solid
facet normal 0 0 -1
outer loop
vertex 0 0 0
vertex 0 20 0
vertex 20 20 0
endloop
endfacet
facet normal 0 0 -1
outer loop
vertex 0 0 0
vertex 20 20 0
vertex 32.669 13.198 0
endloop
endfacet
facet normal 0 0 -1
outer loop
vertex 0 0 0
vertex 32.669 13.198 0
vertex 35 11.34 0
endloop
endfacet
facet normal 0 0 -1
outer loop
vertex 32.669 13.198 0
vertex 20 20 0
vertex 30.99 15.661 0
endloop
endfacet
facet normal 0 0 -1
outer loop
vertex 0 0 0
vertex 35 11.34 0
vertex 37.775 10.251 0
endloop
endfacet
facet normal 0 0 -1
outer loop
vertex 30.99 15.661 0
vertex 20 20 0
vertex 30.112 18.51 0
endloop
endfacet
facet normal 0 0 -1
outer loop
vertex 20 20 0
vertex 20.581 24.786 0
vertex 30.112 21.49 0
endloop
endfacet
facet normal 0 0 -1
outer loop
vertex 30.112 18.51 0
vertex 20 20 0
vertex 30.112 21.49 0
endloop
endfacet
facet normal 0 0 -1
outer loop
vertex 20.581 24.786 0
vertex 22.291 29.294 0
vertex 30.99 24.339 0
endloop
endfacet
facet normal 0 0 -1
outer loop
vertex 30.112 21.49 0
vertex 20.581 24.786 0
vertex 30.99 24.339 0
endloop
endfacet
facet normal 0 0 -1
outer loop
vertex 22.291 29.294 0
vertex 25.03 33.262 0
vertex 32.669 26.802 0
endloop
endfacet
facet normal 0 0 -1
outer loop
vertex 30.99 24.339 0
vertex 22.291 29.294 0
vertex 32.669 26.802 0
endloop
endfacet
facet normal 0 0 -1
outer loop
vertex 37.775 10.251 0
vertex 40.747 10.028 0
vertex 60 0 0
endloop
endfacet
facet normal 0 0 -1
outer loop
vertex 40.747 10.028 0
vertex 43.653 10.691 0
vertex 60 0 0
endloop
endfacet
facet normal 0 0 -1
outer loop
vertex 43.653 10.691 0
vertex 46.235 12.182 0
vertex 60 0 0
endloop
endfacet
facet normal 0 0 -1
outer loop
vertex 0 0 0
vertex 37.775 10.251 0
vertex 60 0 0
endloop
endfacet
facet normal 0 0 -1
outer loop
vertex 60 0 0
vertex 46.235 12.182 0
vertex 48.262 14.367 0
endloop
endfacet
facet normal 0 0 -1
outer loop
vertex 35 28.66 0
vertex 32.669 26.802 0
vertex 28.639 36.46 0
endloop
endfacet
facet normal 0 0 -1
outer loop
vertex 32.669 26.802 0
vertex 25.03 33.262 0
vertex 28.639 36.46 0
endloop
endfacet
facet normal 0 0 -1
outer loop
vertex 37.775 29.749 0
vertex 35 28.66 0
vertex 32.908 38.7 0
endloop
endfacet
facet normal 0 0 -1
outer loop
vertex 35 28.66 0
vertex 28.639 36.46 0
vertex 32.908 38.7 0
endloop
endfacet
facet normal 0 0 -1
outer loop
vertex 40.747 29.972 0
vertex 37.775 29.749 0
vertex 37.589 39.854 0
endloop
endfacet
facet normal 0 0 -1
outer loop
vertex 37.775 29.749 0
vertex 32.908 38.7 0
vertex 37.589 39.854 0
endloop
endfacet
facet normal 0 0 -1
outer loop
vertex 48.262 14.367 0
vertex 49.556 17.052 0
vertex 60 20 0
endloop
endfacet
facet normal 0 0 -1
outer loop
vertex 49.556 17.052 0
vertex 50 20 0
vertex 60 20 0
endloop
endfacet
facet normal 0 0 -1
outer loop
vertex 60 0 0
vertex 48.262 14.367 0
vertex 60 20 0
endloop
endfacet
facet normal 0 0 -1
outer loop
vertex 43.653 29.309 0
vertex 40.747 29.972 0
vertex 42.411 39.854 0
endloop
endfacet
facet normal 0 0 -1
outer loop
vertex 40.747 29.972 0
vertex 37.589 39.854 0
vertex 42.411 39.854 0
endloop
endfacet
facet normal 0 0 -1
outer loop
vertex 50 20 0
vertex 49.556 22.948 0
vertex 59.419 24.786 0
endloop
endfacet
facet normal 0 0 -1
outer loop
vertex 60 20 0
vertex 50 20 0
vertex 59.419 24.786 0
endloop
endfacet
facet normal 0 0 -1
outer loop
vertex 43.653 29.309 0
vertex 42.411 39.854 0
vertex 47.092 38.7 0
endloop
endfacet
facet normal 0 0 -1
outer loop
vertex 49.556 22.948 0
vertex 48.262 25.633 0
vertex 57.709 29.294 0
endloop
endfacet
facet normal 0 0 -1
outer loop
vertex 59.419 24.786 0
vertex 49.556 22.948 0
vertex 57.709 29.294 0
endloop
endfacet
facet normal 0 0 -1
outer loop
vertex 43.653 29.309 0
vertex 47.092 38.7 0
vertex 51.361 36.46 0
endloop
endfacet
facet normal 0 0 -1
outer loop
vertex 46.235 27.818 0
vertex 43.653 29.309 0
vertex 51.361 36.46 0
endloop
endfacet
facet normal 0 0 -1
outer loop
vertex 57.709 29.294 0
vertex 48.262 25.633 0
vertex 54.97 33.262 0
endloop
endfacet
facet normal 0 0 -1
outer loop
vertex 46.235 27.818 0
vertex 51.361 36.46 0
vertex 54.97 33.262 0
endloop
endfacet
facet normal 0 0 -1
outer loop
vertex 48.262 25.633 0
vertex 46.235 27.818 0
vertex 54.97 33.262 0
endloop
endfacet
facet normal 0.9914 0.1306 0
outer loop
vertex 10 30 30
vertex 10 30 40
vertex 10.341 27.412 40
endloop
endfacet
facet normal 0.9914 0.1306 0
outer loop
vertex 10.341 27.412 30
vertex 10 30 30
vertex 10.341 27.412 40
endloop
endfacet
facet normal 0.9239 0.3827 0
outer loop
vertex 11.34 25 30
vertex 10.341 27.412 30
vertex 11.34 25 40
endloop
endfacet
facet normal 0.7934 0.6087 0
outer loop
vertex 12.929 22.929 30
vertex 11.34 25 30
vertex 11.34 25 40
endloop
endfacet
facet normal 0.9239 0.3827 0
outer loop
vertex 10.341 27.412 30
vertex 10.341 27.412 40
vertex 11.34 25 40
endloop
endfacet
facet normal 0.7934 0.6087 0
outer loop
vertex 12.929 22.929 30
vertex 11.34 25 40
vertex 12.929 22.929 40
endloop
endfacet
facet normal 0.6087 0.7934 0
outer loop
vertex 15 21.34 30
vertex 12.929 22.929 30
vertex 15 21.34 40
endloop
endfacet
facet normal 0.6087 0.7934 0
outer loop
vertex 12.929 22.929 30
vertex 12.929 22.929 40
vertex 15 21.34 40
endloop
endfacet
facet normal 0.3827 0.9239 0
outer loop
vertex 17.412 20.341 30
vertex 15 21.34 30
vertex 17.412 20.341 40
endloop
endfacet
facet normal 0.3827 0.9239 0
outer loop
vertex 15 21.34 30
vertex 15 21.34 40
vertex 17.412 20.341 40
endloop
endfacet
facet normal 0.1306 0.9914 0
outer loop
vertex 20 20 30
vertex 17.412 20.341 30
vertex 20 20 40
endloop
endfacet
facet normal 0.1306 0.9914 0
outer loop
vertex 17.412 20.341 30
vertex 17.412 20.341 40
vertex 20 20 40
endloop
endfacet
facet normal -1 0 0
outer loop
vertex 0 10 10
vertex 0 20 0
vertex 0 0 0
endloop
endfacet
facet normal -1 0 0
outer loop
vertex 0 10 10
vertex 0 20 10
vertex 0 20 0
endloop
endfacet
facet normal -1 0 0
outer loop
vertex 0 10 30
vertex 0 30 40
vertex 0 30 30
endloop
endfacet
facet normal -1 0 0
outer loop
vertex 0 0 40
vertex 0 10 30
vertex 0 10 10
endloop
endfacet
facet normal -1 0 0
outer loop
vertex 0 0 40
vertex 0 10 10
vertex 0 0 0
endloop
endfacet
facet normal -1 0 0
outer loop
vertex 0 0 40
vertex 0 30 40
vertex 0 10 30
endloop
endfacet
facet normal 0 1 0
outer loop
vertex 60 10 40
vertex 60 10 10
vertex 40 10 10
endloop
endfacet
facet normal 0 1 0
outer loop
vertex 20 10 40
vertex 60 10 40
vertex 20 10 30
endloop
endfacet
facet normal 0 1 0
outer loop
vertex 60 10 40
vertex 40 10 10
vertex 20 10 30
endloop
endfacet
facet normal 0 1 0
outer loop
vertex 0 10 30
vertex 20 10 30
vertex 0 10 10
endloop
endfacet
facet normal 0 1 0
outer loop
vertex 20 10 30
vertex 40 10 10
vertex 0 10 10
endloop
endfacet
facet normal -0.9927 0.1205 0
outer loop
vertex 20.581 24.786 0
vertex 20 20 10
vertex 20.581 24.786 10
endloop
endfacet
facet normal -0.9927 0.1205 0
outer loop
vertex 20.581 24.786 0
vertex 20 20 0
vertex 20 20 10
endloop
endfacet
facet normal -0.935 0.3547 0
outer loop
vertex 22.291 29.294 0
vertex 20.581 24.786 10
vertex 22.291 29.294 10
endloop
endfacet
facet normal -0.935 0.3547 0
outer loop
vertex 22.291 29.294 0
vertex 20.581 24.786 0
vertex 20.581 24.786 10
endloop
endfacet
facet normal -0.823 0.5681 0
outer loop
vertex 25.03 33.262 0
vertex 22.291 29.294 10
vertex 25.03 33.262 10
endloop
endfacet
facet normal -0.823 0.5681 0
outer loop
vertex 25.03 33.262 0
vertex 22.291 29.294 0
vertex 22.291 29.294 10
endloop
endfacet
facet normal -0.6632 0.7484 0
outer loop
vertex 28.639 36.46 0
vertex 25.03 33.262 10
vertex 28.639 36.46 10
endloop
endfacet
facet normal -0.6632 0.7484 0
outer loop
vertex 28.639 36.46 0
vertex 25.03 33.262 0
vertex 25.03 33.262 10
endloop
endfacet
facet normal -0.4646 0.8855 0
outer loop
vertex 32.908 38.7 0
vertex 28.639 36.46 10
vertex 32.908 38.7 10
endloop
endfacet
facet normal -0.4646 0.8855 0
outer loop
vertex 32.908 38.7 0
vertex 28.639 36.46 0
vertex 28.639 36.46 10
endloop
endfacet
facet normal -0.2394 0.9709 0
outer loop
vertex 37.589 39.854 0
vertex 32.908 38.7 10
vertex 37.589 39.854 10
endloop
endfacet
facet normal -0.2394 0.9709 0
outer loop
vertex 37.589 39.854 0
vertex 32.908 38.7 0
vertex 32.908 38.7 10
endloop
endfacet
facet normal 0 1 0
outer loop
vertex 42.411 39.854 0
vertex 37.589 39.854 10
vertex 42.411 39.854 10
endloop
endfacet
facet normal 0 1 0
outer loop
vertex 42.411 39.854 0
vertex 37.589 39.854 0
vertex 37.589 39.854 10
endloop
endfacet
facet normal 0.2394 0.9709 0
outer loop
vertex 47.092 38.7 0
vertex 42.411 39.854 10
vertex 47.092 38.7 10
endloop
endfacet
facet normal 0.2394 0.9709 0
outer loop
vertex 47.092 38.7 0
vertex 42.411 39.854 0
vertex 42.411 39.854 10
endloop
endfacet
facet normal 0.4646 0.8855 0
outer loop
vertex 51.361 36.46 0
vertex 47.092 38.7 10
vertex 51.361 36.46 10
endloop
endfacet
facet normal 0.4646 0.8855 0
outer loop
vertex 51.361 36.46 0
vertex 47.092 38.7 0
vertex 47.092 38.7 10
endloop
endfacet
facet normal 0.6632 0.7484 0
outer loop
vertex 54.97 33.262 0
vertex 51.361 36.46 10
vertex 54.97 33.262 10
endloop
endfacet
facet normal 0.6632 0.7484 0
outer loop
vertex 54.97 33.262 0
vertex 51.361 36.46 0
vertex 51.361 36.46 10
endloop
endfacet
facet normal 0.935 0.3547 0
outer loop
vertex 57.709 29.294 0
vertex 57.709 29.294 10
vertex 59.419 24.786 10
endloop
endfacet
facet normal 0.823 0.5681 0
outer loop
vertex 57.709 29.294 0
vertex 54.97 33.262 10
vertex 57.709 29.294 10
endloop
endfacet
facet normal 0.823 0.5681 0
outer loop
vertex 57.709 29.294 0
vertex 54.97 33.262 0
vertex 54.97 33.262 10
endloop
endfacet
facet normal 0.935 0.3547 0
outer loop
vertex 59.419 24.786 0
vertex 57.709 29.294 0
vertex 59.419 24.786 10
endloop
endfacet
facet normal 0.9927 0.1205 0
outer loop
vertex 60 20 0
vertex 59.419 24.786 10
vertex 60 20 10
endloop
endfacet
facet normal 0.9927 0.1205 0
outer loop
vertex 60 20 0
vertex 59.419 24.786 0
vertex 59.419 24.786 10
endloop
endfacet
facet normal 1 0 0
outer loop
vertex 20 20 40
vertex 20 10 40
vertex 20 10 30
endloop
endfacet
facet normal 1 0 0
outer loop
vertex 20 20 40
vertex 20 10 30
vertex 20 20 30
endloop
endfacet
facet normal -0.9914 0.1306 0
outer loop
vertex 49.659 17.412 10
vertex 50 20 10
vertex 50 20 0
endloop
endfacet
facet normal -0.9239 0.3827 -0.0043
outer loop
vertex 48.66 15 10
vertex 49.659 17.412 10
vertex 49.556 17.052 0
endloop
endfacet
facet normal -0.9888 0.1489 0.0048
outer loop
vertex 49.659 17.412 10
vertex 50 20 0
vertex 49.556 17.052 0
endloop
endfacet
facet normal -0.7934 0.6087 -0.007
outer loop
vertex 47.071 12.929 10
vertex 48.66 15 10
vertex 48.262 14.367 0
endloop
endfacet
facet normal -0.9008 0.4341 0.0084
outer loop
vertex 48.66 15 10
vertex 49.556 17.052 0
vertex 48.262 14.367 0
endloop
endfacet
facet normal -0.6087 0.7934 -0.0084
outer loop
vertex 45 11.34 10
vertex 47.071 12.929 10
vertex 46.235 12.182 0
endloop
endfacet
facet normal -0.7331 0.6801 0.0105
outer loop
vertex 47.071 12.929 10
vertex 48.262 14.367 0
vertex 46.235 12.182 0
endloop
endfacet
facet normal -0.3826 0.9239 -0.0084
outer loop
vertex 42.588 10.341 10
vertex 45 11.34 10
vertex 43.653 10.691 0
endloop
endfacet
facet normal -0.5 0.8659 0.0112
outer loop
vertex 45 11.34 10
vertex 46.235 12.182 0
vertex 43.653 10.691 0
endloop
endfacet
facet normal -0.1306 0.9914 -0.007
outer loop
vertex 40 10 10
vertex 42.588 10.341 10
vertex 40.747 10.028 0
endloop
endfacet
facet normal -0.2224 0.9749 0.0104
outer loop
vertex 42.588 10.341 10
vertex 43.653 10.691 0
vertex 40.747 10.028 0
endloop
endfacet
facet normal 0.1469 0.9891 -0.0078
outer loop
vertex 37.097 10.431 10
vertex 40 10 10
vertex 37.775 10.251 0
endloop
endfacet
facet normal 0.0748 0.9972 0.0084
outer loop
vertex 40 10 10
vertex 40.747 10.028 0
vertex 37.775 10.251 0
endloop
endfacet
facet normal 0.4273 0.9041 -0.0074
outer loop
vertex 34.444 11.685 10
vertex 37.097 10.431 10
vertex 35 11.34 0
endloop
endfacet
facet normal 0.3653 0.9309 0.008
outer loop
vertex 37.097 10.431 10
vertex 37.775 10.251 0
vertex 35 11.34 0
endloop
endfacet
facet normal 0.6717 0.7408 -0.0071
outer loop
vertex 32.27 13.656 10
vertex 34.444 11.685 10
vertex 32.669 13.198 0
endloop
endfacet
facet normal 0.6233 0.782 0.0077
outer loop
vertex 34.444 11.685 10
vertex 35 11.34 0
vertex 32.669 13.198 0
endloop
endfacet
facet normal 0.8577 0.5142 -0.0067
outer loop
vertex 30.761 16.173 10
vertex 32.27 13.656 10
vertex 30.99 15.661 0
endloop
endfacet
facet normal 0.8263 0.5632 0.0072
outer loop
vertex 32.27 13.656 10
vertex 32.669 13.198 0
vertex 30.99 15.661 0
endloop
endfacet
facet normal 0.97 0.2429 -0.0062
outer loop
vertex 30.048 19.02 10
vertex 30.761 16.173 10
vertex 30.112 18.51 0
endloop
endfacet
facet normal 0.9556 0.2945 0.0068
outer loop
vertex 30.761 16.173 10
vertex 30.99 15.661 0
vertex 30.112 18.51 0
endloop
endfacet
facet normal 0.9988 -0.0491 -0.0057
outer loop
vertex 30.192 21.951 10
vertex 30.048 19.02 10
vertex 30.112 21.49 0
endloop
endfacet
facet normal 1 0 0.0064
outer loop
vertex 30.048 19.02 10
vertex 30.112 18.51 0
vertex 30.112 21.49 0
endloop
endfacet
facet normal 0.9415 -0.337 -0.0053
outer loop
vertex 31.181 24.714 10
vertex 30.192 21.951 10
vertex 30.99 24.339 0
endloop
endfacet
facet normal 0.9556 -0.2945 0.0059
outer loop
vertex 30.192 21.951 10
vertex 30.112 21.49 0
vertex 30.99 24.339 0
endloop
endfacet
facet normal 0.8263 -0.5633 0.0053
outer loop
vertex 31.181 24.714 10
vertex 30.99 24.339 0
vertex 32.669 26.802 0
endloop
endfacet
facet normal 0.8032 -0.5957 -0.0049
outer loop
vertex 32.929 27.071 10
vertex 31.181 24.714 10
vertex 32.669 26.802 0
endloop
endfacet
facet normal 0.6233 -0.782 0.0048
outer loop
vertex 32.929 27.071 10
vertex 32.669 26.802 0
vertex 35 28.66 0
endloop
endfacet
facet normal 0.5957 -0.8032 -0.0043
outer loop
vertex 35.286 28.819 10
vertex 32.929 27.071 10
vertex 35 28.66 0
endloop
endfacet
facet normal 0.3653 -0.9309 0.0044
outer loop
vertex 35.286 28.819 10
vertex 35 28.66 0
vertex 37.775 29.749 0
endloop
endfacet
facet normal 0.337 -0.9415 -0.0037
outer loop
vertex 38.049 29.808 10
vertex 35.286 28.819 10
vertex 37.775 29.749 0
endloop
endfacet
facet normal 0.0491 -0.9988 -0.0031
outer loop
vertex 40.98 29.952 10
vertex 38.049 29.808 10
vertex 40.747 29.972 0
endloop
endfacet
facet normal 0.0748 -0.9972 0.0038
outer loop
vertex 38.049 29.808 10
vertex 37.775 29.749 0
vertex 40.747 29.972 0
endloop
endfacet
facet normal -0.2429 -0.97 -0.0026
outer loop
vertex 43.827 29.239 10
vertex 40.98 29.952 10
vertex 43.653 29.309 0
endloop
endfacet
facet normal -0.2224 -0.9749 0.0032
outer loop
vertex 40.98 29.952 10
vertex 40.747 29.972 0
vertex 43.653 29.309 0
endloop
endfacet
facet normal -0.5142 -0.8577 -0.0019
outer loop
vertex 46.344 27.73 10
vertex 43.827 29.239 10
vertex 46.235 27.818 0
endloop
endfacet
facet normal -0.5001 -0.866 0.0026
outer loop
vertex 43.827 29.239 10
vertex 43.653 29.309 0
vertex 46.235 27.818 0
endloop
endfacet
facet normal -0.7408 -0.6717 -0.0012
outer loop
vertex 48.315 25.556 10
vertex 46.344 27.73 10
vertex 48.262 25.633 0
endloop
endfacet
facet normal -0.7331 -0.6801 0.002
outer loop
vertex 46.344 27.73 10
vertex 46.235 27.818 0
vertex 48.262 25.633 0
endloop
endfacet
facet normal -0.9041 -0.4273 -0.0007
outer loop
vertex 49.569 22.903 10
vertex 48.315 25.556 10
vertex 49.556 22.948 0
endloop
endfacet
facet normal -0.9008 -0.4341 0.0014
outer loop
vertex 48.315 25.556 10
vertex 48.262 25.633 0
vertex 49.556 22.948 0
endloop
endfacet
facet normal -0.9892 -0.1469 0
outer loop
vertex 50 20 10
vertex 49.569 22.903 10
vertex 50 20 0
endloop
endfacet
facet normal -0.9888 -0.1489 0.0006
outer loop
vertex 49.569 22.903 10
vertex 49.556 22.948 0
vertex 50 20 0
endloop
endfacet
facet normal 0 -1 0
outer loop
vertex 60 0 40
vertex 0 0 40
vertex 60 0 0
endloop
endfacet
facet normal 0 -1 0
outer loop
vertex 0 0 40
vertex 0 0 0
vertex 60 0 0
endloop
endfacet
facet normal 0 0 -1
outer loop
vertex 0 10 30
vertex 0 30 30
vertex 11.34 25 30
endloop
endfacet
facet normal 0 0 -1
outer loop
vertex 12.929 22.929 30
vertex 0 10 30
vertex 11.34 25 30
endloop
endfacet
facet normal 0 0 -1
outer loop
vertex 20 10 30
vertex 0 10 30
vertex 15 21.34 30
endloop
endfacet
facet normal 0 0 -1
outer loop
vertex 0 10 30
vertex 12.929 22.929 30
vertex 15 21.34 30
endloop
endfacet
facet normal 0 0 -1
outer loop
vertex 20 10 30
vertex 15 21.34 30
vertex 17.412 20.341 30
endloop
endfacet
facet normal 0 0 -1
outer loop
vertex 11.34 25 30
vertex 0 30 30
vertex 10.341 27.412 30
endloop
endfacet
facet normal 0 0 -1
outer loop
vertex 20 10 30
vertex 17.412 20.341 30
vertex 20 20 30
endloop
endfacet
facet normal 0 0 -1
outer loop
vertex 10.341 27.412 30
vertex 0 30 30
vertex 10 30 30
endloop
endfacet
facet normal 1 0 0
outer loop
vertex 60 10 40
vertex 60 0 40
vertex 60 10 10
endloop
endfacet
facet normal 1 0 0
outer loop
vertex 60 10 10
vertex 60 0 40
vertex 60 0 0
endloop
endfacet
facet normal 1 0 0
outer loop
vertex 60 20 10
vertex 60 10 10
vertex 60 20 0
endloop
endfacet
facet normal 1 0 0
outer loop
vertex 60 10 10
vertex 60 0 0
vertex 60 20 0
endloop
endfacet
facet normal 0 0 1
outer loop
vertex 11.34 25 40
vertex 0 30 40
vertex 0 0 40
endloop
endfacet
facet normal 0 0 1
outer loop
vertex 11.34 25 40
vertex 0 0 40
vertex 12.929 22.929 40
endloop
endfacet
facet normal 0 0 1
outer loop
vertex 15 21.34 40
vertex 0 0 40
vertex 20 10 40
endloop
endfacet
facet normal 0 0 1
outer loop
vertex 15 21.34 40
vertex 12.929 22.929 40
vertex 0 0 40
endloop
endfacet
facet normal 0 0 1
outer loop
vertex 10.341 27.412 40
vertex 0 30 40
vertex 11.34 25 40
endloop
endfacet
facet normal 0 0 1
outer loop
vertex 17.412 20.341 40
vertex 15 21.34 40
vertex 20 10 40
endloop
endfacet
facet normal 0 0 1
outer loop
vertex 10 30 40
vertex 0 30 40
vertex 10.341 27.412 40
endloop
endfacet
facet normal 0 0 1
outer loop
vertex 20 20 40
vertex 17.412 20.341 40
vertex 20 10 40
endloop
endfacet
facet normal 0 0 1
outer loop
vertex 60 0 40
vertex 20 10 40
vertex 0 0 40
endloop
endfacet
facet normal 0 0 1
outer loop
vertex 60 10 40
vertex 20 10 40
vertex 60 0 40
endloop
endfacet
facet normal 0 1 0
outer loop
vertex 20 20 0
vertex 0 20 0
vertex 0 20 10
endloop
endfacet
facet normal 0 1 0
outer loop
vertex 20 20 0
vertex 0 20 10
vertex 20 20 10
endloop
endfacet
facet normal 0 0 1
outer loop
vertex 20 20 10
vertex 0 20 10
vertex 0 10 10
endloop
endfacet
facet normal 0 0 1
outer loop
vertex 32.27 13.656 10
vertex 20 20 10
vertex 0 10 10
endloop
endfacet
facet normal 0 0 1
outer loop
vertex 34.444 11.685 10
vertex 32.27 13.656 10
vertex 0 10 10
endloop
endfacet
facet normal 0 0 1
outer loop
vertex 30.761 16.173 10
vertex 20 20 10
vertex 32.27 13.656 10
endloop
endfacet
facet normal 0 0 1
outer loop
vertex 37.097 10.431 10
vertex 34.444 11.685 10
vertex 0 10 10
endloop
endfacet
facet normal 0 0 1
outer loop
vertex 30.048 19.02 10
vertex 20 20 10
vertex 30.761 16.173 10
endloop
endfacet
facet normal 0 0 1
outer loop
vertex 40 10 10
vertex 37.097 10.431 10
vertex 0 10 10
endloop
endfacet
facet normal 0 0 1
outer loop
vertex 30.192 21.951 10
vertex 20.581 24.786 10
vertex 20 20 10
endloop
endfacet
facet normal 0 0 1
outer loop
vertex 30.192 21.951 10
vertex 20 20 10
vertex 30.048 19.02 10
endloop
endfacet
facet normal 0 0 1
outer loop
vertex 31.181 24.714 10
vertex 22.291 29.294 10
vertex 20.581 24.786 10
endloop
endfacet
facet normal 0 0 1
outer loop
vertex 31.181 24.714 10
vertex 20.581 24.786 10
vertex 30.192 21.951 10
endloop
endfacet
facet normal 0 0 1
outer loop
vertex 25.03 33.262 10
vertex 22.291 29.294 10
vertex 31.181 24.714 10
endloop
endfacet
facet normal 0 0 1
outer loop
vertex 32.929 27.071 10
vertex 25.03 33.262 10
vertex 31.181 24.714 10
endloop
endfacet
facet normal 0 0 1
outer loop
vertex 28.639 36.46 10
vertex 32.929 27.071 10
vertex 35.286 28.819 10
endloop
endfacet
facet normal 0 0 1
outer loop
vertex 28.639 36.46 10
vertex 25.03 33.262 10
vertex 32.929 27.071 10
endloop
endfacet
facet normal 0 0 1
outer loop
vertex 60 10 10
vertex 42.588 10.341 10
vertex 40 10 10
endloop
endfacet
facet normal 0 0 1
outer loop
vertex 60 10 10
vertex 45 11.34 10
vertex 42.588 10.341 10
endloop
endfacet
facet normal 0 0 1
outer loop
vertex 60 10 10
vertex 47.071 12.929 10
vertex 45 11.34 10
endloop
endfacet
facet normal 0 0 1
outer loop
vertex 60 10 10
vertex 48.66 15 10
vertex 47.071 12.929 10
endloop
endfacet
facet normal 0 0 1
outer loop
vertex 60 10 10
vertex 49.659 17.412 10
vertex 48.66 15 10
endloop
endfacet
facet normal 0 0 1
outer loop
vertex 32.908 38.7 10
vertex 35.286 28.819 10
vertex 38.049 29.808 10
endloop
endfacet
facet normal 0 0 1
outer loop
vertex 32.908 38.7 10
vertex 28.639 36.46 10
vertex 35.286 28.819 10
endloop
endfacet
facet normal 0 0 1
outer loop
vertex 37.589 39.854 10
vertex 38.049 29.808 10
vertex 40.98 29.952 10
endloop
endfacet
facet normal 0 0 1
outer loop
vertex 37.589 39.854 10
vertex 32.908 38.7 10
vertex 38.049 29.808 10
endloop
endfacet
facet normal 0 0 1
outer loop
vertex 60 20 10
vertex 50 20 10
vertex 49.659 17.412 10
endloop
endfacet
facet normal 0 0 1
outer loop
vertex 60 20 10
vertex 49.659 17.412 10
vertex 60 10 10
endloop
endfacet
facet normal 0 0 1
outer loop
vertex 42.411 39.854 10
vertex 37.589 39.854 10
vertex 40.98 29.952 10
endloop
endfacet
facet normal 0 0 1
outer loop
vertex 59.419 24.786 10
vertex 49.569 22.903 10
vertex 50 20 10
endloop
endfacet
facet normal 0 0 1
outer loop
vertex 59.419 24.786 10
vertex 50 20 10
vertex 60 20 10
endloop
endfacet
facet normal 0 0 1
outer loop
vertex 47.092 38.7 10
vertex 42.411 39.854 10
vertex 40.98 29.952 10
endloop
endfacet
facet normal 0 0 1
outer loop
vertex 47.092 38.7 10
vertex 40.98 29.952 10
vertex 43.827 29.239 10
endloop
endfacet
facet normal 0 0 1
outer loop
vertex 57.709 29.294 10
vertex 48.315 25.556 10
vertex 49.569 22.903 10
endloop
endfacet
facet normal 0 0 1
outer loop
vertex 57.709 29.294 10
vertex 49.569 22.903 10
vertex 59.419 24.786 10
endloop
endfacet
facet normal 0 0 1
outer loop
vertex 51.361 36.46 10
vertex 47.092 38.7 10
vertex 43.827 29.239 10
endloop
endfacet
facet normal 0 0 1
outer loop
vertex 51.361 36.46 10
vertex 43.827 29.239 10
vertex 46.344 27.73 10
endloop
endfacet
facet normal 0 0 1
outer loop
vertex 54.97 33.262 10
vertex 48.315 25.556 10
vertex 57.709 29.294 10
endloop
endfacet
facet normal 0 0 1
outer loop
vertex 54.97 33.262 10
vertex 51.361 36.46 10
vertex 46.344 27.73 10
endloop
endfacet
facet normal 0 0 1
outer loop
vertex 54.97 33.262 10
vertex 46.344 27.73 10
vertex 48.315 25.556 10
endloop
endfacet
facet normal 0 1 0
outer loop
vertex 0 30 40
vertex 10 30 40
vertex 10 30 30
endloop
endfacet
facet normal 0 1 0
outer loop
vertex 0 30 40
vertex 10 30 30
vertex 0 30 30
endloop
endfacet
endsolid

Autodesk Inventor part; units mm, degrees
ref_plane "YZ Plane" through (0, 0, 0) normal (1, 0, 0) x (0, 1, 0)
ref_plane "XZ Plane" through (0, 0, 0) normal (0, 1, 0) x (-1, 0, 0)
ref_plane "XY Plane" through (0, 0, 0) normal (0, 0, 1) x (1, 0, 0)
sketch "草圖1" plane through (0, 0, 0) normal (0, 0, 1) x (1, 0, 0)
  line L0 (0, 0) -> (60, 0)
  line L1 (60, 0) -> (60, 10)
  line L2 (60, 10) -> (0, 10)
  line L3 (0, 10) -> (0, 0)
  circle A0 centre (40, 20) radius 10
  arc A1 (60, 20) -> (20, 20) centre (40, 20) ccw
  line L4 (20, 20) -> (20, 10)
  line L5 (60, 20) -> (60, 10)
  line L6 (20, 10) -> (0, 10)
  line L7 (0, 10) -> (0, 20)
  line L8 (0, 20) -> (20, 20)
  line L9 (20, 20) -> (20, 10)
  point P0 (40, 10)
  dimension "d0" = 60
  dimension "d1" = 10
  dimension "d2" = 20
  dimension "d3" = 40
  dimension "d4" = 10
  dimension "d5" = 20
  dimension "d10" = 20
  dimension "d11" = 10
extrude "擠出1" add sketch "草圖1" along normal blind 10 contours L7 L8 L4 L2 | L2 L4 A1 L5
extrude "擠出2" add sketch "草圖1" along normal blind 40 contours L3 L2 L1 L0
sketch "草圖2" plane through (0, 0, 40) normal (0, 0, 1) x (1, 0, 0)
  line L0 (0, 10) -> (0, 0) projected
  line L1 (0, 10) -> (20, 10)
  line L2 (20, 10) -> (20, 20)
  line L3 (10, 30) -> (0, 30)
  line L4 (0, 30) -> (0, 10)
  arc A0 (10, 30) -> (20, 20) centre (20, 30) ccw
extrude "擠出3" add sketch "草圖2" against normal blind 10
